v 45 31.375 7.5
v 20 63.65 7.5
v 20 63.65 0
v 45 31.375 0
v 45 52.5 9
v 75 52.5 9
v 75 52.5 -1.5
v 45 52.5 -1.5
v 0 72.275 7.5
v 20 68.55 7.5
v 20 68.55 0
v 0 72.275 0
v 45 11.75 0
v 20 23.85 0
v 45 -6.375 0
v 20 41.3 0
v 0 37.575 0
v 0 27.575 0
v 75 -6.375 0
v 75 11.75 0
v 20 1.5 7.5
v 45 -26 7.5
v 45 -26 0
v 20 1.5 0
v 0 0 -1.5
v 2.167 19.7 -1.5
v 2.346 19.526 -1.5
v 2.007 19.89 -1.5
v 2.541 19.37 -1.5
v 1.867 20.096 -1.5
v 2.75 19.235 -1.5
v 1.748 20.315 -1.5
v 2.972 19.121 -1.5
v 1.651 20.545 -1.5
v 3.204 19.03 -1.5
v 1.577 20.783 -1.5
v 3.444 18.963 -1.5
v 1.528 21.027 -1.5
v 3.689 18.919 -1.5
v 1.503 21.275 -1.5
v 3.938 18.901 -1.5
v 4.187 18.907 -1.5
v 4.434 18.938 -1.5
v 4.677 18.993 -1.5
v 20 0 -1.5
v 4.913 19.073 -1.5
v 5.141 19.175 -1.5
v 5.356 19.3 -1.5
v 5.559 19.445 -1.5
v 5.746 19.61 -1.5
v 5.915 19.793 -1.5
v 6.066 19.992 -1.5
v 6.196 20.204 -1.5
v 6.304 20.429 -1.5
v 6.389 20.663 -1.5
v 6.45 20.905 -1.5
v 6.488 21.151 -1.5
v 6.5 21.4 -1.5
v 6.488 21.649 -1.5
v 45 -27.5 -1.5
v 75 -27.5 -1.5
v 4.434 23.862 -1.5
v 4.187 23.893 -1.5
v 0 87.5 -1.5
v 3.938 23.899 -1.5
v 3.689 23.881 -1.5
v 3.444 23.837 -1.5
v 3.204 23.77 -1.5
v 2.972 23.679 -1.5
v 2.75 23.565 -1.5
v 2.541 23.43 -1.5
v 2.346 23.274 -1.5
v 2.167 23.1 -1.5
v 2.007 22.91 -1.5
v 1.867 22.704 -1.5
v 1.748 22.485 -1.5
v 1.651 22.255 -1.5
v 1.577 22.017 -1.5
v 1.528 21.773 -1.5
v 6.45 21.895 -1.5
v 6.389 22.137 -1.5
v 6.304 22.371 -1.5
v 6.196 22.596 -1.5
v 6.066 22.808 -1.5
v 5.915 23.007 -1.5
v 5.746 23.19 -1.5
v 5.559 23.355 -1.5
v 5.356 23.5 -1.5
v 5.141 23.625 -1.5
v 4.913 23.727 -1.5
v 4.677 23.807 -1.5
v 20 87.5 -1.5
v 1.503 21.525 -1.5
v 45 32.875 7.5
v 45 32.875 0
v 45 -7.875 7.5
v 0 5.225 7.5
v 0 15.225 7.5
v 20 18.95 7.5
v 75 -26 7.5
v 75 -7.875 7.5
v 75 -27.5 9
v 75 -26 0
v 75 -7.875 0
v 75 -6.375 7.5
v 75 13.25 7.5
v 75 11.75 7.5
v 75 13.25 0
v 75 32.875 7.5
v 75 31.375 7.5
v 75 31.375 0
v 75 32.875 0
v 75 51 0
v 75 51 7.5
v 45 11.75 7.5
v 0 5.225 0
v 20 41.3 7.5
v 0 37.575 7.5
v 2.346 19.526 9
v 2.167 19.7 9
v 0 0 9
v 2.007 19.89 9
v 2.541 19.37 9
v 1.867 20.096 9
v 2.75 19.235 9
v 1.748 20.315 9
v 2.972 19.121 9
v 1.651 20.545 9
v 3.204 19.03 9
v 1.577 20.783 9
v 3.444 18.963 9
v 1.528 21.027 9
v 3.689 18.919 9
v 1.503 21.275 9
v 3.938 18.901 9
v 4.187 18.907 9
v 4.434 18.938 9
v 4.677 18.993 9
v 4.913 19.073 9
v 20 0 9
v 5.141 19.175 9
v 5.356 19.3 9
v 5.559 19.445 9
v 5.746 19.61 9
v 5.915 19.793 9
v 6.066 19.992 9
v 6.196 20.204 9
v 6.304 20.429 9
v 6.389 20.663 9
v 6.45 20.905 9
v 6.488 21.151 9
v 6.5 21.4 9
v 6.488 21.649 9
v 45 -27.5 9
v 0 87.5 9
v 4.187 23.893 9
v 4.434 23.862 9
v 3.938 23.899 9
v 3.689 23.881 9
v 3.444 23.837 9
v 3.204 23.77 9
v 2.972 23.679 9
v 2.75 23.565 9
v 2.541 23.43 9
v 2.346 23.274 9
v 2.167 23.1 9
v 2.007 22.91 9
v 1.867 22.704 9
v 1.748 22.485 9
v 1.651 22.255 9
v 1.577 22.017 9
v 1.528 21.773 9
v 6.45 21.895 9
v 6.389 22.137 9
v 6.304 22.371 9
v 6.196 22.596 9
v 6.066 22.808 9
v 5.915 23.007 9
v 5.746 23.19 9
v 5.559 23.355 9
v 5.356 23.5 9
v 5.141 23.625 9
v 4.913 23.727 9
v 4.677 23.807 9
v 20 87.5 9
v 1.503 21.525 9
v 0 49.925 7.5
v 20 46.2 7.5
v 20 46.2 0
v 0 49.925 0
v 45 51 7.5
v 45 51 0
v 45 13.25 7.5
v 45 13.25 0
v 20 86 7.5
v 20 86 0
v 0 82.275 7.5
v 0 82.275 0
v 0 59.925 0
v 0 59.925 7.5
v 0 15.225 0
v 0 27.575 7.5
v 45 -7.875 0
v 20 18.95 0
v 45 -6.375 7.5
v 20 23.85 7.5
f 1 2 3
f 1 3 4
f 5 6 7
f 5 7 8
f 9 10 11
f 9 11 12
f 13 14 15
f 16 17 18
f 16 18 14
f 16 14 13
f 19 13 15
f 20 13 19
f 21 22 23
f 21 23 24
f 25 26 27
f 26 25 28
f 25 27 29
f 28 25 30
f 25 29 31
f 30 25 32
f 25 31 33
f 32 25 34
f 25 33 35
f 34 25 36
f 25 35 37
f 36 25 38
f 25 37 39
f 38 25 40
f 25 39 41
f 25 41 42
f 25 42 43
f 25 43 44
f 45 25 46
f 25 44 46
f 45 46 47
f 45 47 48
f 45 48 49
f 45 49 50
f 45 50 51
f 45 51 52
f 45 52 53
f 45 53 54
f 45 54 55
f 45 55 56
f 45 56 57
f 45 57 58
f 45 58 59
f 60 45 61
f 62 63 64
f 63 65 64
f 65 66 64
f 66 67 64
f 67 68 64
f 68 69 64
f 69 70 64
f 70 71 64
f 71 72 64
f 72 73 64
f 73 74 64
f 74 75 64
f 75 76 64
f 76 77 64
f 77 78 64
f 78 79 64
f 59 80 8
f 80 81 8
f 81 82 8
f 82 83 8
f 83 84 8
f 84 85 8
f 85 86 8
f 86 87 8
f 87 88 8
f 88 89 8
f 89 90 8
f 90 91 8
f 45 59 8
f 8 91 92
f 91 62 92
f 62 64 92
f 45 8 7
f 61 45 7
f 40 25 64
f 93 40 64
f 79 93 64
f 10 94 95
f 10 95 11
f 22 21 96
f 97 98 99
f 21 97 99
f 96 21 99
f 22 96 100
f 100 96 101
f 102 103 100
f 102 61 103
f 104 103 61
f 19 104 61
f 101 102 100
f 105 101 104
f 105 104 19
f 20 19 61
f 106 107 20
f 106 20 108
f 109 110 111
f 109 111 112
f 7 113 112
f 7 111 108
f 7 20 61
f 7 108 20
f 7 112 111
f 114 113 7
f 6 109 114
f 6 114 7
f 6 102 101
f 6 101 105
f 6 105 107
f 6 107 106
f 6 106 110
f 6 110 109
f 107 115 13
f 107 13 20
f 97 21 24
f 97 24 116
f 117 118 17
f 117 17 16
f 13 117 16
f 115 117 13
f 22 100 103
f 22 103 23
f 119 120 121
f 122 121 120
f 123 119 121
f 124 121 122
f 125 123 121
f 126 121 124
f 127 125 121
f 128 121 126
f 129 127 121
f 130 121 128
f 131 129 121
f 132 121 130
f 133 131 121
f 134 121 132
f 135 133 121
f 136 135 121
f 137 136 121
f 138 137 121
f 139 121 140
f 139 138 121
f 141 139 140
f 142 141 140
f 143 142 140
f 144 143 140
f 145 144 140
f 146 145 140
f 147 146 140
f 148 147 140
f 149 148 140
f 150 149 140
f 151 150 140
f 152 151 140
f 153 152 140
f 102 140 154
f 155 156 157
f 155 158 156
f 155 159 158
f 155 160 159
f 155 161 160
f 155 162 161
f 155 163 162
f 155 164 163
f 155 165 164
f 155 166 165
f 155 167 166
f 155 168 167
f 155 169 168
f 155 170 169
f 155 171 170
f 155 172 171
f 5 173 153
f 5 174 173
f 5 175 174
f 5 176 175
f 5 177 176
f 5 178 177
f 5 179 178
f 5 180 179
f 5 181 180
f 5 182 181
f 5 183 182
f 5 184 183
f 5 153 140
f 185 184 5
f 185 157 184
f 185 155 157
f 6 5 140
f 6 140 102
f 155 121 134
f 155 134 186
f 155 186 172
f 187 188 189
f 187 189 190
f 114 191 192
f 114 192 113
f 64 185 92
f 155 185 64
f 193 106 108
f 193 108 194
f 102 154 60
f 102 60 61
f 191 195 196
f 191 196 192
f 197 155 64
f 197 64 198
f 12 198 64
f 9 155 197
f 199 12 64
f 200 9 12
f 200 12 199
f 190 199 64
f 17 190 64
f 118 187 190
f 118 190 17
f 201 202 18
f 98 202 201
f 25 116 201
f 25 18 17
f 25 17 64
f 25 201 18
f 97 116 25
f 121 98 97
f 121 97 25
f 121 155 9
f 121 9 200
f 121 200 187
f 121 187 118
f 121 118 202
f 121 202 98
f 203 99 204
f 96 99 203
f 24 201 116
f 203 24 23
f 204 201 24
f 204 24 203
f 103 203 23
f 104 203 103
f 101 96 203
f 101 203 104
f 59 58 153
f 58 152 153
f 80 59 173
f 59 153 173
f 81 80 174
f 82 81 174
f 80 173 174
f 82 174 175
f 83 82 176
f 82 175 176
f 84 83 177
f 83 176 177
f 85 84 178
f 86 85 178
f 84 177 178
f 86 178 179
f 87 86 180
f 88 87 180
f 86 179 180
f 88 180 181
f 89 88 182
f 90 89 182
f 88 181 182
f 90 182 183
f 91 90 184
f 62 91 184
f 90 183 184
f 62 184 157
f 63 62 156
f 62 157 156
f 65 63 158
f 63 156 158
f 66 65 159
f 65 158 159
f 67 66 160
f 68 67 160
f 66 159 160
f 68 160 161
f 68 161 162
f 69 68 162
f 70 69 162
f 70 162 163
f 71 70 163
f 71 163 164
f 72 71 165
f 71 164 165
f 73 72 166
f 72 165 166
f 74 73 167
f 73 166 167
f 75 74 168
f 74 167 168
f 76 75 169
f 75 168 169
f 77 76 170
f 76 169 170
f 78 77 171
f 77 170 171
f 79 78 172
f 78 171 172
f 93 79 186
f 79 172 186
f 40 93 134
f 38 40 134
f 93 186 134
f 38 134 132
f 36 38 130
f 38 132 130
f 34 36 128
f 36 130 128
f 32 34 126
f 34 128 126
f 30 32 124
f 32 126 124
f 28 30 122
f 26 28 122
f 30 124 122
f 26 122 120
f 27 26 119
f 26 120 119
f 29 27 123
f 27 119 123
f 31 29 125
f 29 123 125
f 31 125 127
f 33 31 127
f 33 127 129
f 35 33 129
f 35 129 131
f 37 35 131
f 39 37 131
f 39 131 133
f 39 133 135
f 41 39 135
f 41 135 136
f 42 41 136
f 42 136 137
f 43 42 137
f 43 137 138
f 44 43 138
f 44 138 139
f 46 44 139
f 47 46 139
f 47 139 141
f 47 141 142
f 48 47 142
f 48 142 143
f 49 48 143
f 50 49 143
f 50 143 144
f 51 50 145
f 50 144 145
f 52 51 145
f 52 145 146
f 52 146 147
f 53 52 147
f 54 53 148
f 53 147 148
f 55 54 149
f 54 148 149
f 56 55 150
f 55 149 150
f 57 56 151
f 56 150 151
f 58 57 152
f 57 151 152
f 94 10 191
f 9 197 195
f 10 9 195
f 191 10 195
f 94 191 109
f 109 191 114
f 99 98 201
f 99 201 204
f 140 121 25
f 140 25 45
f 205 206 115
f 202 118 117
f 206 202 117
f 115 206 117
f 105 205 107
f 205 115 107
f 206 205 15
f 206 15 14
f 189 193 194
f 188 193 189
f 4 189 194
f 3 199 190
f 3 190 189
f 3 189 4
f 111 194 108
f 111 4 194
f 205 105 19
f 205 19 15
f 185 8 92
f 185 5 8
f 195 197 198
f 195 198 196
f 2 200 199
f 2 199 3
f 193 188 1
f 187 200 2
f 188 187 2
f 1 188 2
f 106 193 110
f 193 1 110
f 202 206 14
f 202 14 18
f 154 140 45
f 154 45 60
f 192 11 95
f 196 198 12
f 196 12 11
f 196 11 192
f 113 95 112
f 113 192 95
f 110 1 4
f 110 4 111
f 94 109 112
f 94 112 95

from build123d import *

# Parameters (mm, degrees)
SKETCH1_R           = 2.5
BOSS_EXTRUDE1_DEPTH = 1.5
BOSS_EXTRUDE2_START = 7.5
SKETCH1_13_R        = 2.5
BOSS_EXTRUDE2_DEPTH = 7.5
BOSS_EXTRUDE3_START = 9
SKETCH1_14_R        = 2.5
BOSS_EXTRUDE3_DEPTH = 1.5


with BuildPart() as part:
    # Sketch1 → Boss-Extrude1 (new body)
    with BuildSketch(Plane.XY):
        Polygon((0, 0), (20, 0), (45, -27.5), (75, -27.5), (75, 52.5), (45, 52.5), (20, 87.5), (0, 87.5), align=None)
        with Locations((4, 21.4)):
            Circle(SKETCH1_R, mode=Mode.SUBTRACT)
    extrude(amount=-BOSS_EXTRUDE1_DEPTH)

    # Sketch1<13> → Boss-Extrude2 (add)
    # profile 1 of 5: a face of its own
    with BuildSketch(Plane.XY.offset(BOSS_EXTRUDE2_START)):
        Polygon((0, 5.225), (0, 0), (20, 0), (45, -27.5), (75, -27.5), (75, -26), (45, -26), (20, 1.5), align=None)
    # profile 2 of 5: a face of its own
    with BuildSketch(Plane.XY.offset(BOSS_EXTRUDE2_START)):
        Polygon((0, 27.575), (0, 15.225), (20, 18.95), (45, -7.875), (75, -7.875), (75, -6.375), (45, -6.375), (20, 23.85), align=None)
        with Locations((4, 21.4)):
            Circle(SKETCH1_13_R, mode=Mode.SUBTRACT)
    # profile 3 of 5: a face of its own
    with BuildSketch(Plane.XY.offset(BOSS_EXTRUDE2_START)):
        Polygon((0, 49.925), (0, 37.575), (20, 41.3), (45, 11.75), (75, 11.75), (75, 13.25), (45, 13.25), (20, 46.2), align=None)
    # profile 4 of 5: a face of its own
    with BuildSketch(Plane.XY.offset(BOSS_EXTRUDE2_START)):
        Polygon((0, 72.275), (0, 59.925), (20, 63.65), (45, 31.375), (75, 31.375), (75, 32.875), (45, 32.875), (20, 68.55), align=None)
    # profile 5 of 5: a face of its own
    with BuildSketch(Plane.XY.offset(BOSS_EXTRUDE2_START)):
        Polygon((0, 87.5), (0, 82.275), (20, 86), (45, 51), (75, 51), (75, 52.5), (45, 52.5), (20, 87.5), align=None)
    extrude(amount=-BOSS_EXTRUDE2_DEPTH)

    # Sketch1<14> → Boss-Extrude3 (add)
    with BuildSketch(Plane.XY.offset(BOSS_EXTRUDE3_START)):
        Polygon((0, 0), (20, 0), (45, -27.5), (75, -27.5), (75, 52.5), (45, 52.5), (20, 87.5), (0, 87.5), align=None)
        with Locations((4, 21.4)):
            Circle(SKETCH1_14_R, mode=Mode.SUBTRACT)
    extrude(amount=-BOSS_EXTRUDE3_DEPTH)


solid = part.part
